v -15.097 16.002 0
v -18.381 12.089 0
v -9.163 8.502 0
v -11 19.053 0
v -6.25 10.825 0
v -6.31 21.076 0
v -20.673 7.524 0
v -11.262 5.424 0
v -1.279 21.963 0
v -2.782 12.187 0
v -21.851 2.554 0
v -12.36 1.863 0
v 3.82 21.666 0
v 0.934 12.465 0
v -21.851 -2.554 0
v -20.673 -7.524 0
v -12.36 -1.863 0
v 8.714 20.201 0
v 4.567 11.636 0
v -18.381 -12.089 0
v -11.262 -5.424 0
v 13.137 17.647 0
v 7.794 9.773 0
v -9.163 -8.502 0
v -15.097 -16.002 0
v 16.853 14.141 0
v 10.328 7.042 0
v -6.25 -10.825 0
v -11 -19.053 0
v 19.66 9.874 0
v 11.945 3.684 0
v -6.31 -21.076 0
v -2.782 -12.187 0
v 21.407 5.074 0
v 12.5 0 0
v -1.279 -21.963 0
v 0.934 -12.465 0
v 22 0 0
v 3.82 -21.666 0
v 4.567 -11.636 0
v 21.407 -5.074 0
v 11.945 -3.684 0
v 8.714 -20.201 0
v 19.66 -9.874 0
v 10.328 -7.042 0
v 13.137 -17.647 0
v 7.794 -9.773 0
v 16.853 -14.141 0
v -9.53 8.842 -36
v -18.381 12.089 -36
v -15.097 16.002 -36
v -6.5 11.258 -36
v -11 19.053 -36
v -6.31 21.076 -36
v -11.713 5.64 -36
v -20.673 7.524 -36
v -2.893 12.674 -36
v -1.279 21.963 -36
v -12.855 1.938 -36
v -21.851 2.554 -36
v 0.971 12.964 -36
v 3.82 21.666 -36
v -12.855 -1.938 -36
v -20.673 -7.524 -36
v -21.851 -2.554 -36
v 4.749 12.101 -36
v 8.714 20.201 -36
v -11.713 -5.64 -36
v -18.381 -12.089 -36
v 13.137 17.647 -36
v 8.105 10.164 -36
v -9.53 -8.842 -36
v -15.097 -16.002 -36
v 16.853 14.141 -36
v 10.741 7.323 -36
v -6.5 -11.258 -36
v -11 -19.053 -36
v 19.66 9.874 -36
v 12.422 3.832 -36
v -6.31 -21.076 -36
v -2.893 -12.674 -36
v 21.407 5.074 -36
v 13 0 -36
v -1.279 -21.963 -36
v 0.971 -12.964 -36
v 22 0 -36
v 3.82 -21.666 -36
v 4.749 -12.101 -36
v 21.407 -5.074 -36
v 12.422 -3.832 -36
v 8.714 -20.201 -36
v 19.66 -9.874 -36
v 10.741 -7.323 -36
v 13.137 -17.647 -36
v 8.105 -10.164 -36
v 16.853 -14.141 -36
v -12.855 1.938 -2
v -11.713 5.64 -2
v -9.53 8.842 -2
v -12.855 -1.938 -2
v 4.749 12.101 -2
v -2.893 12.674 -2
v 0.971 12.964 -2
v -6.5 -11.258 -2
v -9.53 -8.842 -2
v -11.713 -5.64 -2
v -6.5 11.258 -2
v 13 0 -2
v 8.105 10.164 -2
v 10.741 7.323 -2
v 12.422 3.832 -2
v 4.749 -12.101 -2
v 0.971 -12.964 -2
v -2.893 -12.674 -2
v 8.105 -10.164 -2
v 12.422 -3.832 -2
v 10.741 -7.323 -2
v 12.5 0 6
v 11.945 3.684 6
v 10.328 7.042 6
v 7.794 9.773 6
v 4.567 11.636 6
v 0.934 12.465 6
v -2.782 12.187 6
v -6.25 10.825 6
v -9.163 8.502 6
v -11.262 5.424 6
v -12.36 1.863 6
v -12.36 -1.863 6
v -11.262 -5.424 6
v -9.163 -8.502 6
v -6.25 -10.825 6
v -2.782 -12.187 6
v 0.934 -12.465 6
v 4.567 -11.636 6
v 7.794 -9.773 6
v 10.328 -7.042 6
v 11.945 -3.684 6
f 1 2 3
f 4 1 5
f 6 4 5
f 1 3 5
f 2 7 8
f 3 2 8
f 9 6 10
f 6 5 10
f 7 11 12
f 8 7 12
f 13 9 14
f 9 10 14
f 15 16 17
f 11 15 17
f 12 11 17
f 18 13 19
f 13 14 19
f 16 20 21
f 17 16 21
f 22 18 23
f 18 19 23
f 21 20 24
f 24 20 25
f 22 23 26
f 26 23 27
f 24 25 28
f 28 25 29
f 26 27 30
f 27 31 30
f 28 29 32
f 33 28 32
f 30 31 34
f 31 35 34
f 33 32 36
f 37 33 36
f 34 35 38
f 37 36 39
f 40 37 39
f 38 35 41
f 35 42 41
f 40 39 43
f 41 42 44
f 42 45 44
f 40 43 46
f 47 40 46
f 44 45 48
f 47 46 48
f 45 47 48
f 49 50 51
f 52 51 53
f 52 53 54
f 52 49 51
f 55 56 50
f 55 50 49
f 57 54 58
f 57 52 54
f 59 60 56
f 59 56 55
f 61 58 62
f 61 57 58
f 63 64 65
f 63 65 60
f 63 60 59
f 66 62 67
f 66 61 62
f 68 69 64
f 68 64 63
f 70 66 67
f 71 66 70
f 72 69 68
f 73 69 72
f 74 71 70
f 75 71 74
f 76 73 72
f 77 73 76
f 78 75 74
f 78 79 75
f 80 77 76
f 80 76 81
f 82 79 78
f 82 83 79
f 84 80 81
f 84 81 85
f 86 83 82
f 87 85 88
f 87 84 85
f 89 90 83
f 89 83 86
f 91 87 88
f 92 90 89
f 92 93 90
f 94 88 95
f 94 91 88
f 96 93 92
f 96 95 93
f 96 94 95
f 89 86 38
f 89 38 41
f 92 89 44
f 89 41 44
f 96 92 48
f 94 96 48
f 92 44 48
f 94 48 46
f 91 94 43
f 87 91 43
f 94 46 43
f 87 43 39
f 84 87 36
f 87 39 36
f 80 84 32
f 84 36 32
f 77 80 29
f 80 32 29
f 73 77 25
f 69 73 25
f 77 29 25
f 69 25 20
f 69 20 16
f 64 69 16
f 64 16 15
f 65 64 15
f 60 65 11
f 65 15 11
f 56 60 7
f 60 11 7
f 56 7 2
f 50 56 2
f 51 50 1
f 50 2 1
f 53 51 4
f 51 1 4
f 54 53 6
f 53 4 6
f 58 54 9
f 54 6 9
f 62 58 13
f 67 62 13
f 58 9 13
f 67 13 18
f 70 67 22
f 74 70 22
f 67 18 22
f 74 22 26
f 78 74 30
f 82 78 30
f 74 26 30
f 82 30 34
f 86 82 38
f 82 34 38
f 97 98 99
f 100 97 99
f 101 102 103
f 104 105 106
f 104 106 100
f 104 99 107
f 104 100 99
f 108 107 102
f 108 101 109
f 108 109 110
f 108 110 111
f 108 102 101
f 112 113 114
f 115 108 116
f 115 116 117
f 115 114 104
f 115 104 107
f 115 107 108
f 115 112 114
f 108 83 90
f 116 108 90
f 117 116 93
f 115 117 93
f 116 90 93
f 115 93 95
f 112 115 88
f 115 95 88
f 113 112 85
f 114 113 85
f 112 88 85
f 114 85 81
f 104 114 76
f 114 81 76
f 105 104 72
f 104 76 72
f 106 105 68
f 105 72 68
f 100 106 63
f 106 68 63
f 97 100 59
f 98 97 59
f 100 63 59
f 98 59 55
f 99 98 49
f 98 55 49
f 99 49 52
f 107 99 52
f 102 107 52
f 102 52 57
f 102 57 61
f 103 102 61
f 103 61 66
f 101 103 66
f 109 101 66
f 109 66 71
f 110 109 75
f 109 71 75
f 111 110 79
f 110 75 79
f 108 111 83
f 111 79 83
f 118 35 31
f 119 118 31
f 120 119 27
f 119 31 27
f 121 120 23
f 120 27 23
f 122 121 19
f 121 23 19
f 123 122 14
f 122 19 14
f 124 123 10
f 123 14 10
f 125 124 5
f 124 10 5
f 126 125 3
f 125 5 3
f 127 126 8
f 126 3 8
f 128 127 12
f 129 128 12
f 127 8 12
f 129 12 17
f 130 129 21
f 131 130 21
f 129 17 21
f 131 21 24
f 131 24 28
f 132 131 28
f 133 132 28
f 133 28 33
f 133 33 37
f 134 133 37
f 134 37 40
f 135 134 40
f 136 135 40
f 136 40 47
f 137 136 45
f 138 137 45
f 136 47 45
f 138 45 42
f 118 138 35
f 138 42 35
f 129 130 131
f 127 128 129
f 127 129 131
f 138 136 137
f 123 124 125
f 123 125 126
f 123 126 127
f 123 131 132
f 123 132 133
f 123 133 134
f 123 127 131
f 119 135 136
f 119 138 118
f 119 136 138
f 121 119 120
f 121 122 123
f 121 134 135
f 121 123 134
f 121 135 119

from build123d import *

# Parameters (mm, degrees)
F0_R     = 12.5
F1_DEPTH = 6
F2_R     = 22
F3_DEPTH = 36
F4_R     = 13
F5_DEPTH = 34


with BuildPart() as f1:
    # F0 (on Top) → F1 (new body)
    with BuildSketch(Plane.XY):
        Circle(F0_R)
    extrude(amount=F1_DEPTH)

    # F2 (on face) → F3 (join)
    with BuildSketch(Plane(origin=(0, 0, 0), x_dir=(1, 0, 0), z_dir=(0, 0, -1))):
        Circle(F2_R)
    extrude(amount=F3_DEPTH)

    # F4 (on face) → F5 (cut)
    with BuildSketch(Plane(origin=(0, 0, -36), x_dir=(1, 0, 0), z_dir=(0, 0, -1))):
        Circle(F4_R)
    extrude(amount=-F5_DEPTH, mode=Mode.SUBTRACT)


solid = f1.part
